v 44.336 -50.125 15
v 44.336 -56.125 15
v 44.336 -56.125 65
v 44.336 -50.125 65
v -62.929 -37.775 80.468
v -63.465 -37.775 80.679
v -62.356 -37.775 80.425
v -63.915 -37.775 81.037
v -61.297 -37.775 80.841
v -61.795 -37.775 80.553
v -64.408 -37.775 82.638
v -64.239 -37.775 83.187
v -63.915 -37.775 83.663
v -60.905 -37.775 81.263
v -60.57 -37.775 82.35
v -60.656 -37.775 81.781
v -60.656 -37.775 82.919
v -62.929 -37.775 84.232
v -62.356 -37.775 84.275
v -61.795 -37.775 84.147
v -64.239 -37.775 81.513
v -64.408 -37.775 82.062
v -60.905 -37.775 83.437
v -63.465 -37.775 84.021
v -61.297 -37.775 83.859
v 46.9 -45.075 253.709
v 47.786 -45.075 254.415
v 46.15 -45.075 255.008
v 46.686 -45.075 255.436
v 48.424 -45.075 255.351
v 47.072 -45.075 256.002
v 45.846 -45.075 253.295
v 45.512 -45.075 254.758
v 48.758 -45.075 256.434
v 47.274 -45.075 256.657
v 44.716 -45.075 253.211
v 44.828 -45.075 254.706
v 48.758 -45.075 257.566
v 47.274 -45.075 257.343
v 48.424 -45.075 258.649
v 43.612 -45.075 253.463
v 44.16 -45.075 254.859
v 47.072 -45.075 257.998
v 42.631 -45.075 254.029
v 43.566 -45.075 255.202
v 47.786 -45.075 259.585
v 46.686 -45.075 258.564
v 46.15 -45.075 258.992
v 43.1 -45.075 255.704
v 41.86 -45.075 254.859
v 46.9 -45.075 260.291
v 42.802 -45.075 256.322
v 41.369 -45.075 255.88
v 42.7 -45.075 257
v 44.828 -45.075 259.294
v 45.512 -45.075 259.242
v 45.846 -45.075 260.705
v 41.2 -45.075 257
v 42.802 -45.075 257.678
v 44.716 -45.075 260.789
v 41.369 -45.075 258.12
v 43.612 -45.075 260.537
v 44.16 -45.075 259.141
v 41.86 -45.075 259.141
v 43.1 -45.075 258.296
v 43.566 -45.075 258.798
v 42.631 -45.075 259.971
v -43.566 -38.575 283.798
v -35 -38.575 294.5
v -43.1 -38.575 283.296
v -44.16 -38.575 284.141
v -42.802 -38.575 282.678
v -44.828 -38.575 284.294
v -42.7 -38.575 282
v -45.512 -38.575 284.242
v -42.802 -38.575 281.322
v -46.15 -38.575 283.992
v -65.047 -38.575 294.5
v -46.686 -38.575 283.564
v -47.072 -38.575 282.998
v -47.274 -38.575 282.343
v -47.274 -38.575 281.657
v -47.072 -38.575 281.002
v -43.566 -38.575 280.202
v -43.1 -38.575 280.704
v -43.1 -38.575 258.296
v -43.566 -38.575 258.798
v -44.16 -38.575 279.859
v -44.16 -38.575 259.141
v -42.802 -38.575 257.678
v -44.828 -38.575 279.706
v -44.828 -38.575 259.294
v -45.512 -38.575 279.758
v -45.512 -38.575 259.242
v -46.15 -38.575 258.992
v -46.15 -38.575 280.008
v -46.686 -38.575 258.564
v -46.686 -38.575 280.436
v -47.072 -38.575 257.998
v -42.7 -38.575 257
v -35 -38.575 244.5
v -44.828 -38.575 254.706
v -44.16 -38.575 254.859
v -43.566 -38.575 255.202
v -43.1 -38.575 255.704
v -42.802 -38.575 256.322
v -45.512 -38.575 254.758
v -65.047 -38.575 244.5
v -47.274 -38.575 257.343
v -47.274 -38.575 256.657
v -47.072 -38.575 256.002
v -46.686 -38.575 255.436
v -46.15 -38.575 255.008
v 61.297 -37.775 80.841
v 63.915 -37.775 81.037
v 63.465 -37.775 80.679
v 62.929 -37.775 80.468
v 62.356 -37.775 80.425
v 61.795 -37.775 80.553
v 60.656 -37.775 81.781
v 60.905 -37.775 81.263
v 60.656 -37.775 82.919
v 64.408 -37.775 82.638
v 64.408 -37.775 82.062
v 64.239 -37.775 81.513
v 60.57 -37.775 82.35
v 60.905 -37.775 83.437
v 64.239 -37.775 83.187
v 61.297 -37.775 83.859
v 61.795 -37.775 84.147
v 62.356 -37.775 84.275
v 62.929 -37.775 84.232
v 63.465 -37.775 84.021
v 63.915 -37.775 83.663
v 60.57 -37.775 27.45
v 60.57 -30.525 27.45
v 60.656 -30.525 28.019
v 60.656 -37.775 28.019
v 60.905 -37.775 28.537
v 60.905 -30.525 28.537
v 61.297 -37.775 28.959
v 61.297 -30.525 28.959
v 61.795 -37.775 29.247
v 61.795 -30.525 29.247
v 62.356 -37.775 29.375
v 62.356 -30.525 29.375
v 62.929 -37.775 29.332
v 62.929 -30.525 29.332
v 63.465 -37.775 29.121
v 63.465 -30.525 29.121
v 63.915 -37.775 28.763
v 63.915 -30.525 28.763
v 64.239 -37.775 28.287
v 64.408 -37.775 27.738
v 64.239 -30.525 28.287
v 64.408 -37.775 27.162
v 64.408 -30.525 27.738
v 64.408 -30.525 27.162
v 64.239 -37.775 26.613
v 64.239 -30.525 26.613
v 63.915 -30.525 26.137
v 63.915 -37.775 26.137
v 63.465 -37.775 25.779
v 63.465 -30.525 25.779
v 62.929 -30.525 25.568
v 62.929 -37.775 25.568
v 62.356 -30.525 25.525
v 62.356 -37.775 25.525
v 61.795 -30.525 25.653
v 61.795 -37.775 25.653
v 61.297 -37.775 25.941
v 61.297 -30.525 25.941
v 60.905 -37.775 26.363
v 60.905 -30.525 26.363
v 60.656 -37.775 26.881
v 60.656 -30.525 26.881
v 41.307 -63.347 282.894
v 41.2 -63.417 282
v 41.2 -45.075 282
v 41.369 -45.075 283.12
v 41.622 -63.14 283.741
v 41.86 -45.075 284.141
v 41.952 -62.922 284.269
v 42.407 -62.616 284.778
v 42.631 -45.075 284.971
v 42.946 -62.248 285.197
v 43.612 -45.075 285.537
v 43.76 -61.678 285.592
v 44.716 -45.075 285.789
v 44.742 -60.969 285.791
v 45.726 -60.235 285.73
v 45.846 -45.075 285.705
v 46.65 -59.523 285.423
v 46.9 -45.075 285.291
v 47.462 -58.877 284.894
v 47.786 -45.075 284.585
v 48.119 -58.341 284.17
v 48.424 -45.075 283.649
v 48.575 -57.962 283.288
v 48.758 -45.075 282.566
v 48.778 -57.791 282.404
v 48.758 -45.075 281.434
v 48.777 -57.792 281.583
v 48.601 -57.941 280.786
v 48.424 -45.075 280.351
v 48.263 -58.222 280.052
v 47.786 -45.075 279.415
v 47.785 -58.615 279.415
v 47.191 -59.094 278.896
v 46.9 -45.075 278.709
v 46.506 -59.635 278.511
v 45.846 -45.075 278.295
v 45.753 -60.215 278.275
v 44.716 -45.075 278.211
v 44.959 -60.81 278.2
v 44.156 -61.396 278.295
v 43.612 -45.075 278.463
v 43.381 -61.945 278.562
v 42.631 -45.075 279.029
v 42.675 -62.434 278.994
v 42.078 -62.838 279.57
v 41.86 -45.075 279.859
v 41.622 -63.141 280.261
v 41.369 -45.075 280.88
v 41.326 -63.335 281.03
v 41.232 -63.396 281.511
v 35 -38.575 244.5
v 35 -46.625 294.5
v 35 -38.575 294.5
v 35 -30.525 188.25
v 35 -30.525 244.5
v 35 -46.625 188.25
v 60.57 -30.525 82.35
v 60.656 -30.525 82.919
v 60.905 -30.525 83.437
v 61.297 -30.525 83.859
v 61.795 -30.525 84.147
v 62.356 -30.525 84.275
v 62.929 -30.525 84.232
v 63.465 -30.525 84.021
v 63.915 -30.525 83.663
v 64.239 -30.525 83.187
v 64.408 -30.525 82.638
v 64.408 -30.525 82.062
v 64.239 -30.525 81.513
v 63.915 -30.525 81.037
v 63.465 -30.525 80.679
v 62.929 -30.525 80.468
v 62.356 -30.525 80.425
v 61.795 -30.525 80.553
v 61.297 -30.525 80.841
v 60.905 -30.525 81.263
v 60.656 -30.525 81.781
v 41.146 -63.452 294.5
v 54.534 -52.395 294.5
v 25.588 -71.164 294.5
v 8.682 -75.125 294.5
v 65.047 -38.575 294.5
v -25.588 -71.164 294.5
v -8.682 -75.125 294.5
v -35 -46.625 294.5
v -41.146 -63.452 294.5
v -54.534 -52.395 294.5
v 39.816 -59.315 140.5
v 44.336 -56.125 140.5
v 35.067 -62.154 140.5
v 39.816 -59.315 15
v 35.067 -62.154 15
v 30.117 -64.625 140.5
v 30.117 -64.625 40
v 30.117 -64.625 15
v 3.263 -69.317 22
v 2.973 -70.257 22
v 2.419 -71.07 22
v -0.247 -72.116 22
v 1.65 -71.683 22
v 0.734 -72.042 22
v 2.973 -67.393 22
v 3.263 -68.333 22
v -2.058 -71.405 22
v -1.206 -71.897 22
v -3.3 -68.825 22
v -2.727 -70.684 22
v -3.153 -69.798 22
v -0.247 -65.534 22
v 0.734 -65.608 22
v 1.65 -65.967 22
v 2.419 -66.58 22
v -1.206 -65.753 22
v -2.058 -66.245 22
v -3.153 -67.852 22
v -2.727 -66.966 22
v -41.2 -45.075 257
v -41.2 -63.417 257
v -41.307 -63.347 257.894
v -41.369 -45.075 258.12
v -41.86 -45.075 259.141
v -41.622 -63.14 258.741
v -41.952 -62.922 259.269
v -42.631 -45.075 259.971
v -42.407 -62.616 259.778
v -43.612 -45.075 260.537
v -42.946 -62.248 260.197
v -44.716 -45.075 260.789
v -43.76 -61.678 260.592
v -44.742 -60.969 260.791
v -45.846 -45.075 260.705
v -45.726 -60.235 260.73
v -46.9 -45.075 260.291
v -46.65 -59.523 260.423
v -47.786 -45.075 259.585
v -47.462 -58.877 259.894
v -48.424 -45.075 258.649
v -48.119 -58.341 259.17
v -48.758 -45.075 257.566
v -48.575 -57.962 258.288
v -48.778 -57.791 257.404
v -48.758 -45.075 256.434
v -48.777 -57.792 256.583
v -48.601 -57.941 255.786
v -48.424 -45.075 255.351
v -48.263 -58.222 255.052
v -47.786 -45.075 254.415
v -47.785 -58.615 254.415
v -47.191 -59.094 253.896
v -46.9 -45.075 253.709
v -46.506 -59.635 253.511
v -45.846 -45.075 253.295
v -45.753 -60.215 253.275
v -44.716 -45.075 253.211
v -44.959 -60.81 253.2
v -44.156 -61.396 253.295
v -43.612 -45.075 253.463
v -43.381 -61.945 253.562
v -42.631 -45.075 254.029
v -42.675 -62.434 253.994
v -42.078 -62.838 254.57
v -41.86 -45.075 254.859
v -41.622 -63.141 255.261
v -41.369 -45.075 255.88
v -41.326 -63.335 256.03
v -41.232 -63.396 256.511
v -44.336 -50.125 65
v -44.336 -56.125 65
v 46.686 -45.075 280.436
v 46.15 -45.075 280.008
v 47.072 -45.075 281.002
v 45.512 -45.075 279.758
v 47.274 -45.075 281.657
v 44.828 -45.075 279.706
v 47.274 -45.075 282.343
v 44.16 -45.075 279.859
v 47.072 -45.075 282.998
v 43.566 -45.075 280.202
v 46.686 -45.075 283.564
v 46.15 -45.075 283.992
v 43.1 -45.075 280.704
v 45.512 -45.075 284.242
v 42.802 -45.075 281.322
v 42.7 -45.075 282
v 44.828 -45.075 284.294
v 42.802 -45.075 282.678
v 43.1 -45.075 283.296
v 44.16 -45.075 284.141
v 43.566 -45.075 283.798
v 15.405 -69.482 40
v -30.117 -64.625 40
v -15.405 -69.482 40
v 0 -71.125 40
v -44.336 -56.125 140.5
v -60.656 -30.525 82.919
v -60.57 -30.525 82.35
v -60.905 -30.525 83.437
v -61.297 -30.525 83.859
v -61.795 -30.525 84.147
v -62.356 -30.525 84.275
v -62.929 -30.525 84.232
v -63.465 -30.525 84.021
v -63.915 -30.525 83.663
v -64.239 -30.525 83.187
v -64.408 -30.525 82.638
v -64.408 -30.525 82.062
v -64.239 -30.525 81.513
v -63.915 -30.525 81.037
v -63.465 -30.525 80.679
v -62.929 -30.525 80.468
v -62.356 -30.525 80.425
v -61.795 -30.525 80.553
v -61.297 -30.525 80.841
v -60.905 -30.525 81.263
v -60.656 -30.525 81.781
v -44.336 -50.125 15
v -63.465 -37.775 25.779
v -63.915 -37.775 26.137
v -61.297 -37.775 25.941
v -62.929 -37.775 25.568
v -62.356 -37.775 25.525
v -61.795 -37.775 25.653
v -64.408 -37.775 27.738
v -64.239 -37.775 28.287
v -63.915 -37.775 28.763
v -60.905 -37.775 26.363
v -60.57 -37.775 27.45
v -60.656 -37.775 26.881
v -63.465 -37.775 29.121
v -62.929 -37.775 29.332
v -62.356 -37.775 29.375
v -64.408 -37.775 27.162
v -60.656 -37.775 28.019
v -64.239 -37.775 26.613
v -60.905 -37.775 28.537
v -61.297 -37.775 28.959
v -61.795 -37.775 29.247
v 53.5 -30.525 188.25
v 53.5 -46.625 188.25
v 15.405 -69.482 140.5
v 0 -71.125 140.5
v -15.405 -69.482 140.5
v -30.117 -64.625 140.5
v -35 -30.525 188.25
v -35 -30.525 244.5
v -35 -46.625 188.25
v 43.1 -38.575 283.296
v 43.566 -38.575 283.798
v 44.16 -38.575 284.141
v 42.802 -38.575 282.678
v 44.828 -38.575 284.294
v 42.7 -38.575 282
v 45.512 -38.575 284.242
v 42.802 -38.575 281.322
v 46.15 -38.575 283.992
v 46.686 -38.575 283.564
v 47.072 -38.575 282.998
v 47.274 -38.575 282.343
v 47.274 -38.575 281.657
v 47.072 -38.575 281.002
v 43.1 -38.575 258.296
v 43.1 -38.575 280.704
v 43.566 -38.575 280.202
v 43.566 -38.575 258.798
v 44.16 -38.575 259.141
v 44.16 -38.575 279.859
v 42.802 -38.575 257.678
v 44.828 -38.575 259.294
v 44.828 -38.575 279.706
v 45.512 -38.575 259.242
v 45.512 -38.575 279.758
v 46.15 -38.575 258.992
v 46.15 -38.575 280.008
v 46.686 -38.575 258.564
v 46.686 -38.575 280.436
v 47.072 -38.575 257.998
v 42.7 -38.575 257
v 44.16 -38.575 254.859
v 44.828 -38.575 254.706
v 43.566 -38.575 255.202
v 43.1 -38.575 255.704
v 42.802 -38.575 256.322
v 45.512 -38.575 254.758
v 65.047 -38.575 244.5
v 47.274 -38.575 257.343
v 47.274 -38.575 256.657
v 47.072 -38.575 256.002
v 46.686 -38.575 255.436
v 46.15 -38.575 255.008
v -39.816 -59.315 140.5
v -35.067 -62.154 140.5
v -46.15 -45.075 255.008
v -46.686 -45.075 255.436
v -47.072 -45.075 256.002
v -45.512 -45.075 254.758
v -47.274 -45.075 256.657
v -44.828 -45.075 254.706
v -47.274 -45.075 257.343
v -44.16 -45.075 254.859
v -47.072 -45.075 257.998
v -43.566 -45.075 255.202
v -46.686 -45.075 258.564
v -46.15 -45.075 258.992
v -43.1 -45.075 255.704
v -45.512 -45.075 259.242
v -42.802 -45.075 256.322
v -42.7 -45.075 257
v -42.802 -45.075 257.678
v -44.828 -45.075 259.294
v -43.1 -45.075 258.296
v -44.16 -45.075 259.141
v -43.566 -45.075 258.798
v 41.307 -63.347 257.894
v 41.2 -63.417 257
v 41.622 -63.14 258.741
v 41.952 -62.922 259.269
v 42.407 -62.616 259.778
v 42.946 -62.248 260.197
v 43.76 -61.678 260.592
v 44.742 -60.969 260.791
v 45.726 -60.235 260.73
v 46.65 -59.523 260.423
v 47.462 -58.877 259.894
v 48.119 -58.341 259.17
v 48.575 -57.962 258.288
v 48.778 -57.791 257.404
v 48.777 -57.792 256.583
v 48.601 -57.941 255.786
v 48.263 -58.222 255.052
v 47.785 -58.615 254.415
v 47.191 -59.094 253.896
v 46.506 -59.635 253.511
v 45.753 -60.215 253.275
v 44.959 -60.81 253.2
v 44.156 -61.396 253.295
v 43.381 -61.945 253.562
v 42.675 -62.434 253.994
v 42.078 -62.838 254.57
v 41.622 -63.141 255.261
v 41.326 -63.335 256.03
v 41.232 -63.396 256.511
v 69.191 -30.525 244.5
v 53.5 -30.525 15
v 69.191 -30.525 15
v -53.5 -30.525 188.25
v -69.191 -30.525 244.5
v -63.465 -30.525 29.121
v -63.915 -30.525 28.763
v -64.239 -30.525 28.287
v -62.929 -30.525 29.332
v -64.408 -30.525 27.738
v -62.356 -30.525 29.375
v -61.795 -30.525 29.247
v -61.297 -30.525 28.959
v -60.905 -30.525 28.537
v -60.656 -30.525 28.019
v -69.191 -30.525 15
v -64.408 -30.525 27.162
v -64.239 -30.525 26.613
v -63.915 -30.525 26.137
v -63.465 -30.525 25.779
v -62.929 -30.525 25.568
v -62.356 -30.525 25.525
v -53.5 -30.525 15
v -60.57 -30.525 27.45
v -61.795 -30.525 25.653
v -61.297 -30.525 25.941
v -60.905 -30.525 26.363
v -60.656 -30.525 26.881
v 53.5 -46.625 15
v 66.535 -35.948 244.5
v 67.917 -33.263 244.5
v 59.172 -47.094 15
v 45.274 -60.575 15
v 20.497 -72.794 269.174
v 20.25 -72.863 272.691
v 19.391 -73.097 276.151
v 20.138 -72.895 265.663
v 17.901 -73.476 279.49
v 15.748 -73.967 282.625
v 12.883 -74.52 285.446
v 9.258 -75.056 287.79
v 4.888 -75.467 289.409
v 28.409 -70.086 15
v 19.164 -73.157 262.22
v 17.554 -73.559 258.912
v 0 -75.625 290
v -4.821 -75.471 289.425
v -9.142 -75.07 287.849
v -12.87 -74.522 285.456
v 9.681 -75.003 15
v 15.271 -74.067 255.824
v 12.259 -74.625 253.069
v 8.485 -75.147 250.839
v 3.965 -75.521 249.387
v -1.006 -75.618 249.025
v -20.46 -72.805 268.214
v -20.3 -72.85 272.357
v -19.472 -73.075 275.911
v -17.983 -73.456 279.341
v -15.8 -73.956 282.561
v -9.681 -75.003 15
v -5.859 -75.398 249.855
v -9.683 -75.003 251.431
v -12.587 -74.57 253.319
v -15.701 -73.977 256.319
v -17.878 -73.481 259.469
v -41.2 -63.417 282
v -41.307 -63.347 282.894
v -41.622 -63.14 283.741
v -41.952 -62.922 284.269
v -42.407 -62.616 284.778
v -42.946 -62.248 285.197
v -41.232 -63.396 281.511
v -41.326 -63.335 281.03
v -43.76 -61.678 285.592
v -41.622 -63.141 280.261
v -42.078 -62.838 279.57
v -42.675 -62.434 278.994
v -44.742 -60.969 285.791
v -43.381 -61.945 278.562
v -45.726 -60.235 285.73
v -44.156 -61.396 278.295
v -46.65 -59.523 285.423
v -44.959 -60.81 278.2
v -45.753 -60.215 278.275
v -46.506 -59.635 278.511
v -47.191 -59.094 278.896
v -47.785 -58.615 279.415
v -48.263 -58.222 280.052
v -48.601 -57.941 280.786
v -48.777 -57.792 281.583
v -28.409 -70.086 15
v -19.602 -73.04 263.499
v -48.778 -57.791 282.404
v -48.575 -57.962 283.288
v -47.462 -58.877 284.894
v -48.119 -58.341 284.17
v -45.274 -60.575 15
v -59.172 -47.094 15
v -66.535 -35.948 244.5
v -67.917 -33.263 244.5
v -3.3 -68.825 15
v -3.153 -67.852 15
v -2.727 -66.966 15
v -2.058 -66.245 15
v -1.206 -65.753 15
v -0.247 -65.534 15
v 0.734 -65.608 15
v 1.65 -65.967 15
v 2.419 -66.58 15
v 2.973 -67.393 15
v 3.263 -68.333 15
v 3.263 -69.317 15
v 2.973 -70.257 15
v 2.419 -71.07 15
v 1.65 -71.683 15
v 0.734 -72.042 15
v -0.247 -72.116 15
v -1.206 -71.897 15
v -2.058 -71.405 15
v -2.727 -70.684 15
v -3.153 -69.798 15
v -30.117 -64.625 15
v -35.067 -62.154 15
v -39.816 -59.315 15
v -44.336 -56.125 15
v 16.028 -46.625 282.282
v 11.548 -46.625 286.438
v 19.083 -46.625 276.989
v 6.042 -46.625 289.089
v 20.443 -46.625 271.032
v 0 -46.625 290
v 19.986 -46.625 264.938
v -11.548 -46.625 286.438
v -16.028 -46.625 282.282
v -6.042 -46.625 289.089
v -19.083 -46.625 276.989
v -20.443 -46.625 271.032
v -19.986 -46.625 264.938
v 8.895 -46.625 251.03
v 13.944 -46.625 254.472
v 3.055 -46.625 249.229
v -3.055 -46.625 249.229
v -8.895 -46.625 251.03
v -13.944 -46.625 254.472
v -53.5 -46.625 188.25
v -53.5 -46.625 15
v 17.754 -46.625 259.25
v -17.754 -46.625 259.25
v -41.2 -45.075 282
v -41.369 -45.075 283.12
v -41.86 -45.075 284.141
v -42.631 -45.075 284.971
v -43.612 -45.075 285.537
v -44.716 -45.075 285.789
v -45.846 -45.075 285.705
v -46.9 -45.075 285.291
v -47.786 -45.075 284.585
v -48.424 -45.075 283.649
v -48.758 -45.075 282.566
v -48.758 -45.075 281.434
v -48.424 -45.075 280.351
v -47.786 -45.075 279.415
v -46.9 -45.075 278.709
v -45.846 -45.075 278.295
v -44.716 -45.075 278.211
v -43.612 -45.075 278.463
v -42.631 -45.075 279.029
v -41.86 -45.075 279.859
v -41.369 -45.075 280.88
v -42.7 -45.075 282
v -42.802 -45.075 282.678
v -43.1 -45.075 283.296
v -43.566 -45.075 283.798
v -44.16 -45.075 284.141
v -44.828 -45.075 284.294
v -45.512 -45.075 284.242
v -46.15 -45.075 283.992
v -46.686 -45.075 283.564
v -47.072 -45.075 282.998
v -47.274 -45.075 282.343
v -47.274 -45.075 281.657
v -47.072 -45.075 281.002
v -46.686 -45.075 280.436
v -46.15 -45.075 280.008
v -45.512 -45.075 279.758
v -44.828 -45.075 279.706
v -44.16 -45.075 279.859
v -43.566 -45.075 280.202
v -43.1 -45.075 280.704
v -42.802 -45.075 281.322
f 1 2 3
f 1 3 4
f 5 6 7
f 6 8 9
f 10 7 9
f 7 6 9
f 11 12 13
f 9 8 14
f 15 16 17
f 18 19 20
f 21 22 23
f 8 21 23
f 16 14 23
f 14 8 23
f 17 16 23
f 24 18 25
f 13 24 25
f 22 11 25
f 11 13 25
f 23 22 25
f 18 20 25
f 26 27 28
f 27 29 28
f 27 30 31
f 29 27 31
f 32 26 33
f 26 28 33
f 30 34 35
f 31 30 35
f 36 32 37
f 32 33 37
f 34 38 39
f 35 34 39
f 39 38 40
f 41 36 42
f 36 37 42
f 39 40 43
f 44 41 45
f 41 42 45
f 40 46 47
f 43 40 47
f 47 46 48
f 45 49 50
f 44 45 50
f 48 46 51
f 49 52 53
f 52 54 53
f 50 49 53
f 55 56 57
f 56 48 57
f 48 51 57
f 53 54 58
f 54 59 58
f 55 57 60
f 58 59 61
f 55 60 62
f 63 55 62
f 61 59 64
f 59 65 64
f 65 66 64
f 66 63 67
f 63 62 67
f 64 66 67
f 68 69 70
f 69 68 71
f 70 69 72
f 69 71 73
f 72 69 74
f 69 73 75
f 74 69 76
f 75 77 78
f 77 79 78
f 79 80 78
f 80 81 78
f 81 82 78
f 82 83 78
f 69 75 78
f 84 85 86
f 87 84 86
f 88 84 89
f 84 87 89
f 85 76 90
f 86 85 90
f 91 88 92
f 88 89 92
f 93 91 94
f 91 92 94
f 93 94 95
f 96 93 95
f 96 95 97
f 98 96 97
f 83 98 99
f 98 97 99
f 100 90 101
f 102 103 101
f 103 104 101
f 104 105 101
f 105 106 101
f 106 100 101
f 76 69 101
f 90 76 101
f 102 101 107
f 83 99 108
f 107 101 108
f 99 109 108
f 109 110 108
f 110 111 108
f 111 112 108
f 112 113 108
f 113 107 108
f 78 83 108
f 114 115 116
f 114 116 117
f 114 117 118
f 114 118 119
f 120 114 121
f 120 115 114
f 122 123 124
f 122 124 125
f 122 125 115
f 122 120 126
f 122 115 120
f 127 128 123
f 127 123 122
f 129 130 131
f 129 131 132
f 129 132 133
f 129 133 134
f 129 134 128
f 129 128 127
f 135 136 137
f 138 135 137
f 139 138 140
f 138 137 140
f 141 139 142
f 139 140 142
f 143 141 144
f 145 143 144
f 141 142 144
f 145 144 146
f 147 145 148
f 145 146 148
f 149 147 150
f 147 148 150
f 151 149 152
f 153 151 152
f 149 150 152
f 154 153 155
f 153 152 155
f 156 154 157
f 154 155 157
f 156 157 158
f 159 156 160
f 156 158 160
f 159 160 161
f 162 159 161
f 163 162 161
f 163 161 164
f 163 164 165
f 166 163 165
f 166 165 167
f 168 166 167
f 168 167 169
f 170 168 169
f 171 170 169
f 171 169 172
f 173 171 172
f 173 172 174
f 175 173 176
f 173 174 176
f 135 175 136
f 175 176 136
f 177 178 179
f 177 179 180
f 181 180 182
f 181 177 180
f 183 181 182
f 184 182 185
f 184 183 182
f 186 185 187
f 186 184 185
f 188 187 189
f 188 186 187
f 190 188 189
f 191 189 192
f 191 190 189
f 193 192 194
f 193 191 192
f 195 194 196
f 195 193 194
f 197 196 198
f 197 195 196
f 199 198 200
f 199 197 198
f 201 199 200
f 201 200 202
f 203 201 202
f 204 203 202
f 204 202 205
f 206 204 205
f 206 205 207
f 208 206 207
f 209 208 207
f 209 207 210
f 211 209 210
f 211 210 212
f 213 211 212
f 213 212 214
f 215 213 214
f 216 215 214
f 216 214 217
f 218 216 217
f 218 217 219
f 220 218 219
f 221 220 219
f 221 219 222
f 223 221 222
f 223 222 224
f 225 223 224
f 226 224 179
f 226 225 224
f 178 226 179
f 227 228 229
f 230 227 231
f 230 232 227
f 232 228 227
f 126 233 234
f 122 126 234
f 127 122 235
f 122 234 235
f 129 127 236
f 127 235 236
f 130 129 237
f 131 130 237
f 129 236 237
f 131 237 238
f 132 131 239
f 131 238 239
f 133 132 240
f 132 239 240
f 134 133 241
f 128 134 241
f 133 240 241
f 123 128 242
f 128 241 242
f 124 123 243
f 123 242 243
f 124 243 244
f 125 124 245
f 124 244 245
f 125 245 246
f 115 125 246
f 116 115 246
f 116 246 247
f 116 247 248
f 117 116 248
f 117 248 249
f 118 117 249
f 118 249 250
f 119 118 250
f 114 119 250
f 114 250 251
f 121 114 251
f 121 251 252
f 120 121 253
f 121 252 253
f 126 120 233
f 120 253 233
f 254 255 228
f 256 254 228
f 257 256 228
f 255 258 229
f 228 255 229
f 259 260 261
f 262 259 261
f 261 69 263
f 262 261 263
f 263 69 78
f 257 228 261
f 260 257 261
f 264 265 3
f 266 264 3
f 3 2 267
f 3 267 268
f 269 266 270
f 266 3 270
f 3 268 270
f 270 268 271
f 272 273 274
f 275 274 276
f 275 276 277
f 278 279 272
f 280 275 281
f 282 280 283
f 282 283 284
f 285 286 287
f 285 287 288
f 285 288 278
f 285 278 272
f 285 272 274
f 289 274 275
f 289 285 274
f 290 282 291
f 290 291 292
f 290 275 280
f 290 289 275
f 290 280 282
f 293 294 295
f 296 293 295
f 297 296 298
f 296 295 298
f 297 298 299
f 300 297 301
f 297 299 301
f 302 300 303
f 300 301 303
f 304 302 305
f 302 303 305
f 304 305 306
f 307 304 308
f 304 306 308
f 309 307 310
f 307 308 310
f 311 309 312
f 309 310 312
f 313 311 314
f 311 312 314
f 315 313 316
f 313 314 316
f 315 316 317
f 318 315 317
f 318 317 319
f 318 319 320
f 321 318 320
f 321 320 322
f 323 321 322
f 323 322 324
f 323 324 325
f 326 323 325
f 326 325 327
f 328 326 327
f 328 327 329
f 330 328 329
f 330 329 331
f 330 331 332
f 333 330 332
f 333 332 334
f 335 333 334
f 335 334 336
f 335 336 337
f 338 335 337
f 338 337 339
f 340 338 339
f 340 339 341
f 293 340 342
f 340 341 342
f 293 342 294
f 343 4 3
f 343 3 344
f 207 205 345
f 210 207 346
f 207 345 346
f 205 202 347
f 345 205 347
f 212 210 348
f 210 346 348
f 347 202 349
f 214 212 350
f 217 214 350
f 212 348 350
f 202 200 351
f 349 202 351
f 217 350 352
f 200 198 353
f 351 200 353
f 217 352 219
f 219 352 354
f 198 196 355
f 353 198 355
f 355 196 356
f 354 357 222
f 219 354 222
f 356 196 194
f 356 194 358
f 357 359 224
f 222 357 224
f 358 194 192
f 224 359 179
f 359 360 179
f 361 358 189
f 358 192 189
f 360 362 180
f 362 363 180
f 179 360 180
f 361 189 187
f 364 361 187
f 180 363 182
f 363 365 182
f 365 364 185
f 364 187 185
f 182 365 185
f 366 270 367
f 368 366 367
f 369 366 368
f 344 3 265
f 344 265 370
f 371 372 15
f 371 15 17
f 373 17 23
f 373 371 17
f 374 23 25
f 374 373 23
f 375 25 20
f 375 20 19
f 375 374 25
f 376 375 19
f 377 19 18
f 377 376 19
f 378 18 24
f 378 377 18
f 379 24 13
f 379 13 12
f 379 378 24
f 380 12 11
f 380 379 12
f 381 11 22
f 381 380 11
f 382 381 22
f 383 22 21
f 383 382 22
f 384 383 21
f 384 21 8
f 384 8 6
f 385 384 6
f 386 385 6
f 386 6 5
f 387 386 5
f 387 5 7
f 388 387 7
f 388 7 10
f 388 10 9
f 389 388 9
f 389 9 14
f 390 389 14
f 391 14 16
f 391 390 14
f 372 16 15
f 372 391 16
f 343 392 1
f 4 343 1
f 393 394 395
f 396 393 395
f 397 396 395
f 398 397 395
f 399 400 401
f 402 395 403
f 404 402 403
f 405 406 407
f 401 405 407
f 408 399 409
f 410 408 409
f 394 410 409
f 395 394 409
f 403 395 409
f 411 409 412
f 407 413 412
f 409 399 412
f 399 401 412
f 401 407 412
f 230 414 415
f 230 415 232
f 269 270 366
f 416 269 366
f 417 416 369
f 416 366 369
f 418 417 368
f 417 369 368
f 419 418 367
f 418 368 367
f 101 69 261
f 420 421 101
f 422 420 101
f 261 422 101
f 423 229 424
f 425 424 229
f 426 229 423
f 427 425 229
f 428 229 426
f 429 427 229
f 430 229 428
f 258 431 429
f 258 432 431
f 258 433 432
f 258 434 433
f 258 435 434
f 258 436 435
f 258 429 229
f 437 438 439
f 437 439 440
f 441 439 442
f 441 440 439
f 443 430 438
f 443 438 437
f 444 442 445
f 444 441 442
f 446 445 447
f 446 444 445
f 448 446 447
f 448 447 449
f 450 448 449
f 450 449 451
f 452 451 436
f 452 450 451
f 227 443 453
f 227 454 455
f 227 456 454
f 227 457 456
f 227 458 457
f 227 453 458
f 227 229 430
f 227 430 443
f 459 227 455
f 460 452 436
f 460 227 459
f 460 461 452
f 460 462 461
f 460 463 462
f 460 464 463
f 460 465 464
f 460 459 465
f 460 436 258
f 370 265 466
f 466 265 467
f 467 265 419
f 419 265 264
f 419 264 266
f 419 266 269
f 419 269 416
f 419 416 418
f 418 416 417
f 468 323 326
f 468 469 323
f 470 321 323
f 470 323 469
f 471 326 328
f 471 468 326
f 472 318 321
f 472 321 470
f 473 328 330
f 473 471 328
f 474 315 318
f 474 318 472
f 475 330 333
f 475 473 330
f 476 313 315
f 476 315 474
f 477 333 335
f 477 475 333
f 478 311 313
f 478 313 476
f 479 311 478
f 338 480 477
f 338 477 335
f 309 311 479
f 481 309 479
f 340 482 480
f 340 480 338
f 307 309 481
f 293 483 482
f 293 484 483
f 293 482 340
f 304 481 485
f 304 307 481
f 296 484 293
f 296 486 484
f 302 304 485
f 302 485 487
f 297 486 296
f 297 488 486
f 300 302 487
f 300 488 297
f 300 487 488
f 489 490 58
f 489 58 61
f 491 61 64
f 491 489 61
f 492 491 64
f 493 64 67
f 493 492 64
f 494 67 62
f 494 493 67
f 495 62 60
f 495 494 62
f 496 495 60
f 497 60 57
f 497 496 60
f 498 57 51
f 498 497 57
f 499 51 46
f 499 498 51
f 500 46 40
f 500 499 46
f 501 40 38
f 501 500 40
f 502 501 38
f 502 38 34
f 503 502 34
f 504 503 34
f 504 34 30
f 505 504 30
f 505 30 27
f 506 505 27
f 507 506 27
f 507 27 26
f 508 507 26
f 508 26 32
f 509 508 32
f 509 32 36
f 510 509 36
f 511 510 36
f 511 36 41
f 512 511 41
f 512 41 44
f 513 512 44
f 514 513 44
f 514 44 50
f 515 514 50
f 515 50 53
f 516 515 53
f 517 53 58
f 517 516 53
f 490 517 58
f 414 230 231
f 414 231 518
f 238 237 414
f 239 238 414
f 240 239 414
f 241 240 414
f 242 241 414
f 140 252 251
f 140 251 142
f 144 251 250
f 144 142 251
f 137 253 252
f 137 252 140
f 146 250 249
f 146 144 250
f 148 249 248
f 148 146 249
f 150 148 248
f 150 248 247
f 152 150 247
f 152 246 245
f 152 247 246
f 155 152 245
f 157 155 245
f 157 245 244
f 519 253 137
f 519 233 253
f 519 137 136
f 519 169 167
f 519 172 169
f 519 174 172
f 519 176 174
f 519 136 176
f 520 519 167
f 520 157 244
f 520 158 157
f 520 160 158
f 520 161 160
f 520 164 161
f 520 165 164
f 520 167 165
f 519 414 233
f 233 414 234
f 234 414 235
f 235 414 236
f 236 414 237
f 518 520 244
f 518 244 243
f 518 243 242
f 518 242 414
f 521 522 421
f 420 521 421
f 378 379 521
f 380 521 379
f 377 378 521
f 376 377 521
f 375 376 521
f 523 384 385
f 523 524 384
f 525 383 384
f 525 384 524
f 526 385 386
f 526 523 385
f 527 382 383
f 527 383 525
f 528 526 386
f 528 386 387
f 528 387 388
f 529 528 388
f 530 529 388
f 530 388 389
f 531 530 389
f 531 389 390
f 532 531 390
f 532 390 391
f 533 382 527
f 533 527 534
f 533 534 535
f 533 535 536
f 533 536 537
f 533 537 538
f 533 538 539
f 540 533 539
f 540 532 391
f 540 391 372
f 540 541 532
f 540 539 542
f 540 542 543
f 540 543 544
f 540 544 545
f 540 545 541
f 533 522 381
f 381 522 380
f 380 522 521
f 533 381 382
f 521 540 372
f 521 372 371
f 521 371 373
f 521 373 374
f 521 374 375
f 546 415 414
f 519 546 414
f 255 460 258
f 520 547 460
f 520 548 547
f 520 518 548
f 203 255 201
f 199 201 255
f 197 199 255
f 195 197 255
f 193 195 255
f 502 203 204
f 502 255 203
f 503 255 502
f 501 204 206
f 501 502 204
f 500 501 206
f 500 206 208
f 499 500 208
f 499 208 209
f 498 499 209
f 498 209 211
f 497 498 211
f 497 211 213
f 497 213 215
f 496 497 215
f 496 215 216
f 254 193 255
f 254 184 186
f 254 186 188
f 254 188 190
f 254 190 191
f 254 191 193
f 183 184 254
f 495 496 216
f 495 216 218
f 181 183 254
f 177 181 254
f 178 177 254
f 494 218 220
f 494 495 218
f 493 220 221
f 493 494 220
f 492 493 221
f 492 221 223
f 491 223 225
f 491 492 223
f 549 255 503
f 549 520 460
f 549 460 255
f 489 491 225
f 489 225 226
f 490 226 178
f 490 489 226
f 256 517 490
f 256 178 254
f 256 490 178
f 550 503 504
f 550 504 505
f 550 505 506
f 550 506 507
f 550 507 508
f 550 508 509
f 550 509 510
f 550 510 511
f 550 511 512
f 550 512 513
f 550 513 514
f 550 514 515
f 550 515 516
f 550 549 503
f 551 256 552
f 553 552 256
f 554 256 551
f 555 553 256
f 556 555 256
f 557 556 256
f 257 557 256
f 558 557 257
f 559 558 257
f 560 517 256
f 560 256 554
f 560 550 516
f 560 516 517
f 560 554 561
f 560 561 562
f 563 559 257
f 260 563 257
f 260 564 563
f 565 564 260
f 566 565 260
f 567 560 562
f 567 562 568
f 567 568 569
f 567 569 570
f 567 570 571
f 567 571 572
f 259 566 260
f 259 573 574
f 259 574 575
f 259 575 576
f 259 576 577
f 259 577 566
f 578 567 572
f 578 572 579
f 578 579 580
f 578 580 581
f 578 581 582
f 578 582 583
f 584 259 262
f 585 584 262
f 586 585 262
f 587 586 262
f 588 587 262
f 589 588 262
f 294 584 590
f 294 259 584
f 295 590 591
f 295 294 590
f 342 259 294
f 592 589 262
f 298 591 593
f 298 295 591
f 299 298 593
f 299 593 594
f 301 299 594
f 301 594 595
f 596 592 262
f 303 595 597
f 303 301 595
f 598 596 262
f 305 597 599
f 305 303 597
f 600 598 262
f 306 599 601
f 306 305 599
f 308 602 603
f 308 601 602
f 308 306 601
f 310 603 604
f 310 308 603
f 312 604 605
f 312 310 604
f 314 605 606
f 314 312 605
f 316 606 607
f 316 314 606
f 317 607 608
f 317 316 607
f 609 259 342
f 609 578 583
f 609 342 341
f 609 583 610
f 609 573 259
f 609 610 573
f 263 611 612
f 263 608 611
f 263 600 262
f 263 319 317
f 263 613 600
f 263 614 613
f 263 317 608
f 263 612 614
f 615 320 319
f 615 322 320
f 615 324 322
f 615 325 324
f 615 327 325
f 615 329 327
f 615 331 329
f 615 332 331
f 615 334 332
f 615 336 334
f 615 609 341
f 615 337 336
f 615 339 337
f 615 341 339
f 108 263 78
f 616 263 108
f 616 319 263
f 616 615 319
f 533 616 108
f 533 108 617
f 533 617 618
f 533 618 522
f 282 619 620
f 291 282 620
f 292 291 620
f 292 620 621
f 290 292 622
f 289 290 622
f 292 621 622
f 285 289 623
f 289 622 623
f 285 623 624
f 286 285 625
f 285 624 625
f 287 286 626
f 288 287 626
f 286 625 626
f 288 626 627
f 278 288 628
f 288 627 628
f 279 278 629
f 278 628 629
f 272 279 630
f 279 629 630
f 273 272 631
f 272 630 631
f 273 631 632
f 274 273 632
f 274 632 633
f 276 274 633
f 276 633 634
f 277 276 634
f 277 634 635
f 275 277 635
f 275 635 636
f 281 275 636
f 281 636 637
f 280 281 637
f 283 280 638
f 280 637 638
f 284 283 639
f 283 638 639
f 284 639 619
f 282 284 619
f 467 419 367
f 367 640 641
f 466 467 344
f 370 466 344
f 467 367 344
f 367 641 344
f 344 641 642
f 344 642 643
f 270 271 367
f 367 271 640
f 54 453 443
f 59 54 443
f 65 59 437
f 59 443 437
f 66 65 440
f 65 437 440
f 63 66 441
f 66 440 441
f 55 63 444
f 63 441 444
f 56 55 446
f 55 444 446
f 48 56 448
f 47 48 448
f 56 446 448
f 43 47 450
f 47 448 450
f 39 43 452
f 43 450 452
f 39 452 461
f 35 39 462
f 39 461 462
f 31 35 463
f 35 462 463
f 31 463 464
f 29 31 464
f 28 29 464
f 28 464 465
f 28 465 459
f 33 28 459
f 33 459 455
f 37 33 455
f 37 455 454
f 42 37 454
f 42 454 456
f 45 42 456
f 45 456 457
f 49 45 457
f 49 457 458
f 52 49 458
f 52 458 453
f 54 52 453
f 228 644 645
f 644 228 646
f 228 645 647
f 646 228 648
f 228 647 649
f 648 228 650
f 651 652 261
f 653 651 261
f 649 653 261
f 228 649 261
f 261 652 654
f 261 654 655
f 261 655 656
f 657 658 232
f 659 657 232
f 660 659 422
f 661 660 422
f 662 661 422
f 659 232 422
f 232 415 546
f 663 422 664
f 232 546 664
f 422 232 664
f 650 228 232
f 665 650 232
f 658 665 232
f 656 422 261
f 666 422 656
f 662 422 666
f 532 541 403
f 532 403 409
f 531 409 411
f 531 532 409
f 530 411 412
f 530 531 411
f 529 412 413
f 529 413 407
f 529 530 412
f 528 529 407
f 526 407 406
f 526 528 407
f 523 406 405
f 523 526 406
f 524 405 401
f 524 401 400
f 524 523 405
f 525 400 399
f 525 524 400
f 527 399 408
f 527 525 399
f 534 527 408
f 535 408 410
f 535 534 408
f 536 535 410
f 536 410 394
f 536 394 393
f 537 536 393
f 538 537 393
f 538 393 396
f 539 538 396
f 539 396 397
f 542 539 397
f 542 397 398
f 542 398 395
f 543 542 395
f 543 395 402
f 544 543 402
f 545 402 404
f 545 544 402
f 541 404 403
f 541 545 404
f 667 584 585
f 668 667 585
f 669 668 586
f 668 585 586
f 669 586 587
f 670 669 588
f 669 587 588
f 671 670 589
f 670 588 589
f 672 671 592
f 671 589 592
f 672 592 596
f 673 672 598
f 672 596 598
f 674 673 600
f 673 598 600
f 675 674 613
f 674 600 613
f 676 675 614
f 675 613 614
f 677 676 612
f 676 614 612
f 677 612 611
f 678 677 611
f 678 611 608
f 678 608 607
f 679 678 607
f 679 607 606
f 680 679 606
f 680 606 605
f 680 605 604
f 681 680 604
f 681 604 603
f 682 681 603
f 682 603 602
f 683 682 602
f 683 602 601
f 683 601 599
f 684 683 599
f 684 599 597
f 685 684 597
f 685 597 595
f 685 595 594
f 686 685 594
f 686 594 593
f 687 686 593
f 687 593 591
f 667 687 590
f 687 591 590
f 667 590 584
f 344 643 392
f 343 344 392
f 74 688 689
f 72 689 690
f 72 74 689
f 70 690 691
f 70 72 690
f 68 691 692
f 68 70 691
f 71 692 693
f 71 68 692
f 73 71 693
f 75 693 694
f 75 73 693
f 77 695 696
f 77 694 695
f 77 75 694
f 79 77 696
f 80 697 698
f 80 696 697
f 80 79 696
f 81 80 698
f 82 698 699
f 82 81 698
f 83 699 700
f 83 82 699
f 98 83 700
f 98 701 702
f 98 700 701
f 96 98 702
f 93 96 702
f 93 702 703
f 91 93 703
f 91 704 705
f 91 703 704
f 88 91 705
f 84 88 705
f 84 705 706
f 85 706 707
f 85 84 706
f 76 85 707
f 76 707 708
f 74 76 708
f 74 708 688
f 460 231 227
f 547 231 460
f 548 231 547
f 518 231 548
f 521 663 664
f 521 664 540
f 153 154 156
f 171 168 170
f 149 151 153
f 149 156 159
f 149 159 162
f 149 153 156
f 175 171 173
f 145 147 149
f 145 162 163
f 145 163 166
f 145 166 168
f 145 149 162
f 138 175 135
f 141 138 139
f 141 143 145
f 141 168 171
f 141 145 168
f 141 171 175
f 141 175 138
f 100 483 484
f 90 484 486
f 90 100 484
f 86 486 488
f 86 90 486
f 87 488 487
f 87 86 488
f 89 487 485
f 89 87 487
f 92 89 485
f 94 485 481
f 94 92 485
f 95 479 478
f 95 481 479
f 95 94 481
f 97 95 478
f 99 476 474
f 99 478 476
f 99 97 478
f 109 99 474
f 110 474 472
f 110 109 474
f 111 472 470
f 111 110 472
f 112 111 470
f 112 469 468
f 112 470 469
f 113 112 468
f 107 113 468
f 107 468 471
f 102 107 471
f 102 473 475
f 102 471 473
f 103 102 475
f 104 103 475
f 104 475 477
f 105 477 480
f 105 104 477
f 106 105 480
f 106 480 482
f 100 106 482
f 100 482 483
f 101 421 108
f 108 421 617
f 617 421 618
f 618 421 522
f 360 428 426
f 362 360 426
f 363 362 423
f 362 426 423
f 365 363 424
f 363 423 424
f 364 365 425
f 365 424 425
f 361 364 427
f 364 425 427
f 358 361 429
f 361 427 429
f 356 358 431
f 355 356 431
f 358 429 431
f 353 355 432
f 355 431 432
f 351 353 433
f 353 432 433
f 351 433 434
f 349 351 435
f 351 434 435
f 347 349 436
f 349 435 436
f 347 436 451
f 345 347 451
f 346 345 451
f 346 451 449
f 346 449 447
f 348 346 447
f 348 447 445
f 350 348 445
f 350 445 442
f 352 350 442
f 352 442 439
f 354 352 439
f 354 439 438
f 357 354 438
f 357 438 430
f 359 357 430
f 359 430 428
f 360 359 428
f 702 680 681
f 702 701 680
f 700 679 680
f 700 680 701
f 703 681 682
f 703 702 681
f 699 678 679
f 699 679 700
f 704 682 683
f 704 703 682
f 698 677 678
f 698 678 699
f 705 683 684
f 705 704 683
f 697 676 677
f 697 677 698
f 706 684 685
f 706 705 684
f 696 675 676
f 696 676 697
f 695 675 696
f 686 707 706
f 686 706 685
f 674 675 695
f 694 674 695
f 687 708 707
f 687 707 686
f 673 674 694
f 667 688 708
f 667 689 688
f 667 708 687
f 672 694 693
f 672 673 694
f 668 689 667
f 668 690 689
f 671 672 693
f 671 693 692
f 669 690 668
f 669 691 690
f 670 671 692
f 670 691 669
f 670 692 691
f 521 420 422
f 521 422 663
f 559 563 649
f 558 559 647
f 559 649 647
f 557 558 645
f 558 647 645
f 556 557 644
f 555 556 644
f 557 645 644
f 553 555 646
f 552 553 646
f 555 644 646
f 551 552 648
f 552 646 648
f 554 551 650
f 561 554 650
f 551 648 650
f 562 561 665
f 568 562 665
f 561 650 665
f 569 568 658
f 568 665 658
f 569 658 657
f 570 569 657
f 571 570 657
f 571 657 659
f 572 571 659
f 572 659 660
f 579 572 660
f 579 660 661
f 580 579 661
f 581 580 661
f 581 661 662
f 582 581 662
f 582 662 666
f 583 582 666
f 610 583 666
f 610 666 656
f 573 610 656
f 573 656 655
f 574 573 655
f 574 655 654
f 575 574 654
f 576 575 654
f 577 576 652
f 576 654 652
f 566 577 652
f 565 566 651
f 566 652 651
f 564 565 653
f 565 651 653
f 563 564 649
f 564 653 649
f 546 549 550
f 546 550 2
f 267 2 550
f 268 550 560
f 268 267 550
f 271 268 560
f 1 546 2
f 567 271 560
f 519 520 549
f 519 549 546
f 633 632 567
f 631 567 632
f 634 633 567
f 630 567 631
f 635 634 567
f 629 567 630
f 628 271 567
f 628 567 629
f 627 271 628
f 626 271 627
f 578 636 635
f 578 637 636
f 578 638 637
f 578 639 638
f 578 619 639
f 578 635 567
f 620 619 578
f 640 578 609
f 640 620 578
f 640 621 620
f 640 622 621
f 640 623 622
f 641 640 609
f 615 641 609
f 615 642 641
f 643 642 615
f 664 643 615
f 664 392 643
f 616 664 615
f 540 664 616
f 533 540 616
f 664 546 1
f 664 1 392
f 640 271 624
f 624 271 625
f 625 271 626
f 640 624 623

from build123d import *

# Parameters (mm, degrees)
BOSS_EXTRUDE1_START = 15
BOSS_EXTRUDE1_DEPTH = 279.5
SKETCH3_W           = 107
SKETCH3_H           = 93.25
CUT_EXTRUDE1_DEPTH  = 173.25
SKETCH4_R           = 20.5
CUT_EXTRUDE2_DEPTH  = 304.90560212
CUT_EXTRUDE3_START  = -50
CUT_EXTRUDE3_DEPTH  = 50
SKETCH7_R           = 2.3
CUT_EXTRUDE5_DEPTH  = 305.779129174
CUT_EXTRUDE8_START  = -304.43404156
SKETCH11_R          = 3.8
CUT_EXTRUDE8_DEPTH  = 311.43404156
SKETCH14_R          = 1.93
CUT_EXTRUDE9_DEPTH  = 7.25
SKETCH18_W          = 44.336356413
SKETCH18_H          = 6
CUT_EXTRUDE10_DEPTH = 125.5
CUT_EXTRUDE12_DEPTH = 100.5
SKETCH20_W          = 88.672712826
SKETCH20_H          = 6
BOSS_EXTRUDE2_DEPTH = 75.5
SCREW_HEAD_HOLE_R   = 3.3
SCREW_HEAD_HOLE_R_2 = 1.45
CUT_EXTRUDE13_DEPTH = 7


with BuildPart() as part:
    # Sketch1 → Boss-Extrude1 (new body)
    with BuildSketch(Plane.XY.offset(BOSS_EXTRUDE1_START)):
        with BuildLine():
            Line((-69.190786959, -30.525), (-35, -30.525))
            Line((-35, -30.525), (-35, -46.625))
            Line((-35, -46.625), (35, -46.625))
            Line((35, -46.625), (35, -30.525))
            Line((35, -30.525), (69.190786959, -30.525))
            ThreePointArc((69.190786959, -30.525), (0, -75.625), (-69.190786959, -30.525))
        make_face()
    extrude(amount=BOSS_EXTRUDE1_DEPTH)

    # Sketch3 → Cut-Extrude1 (cut)
    with BuildSketch(Plane(origin=(0, 0, 15), x_dir=(-1, 0, 0), z_dir=(0, 0, -1))):
        Rectangle(SKETCH3_W, SKETCH3_H)
    extrude(amount=-CUT_EXTRUDE1_DEPTH, mode=Mode.SUBTRACT)

    # Sketch4 → Cut-Extrude2 (cut, through all)
    with BuildSketch(Plane(origin=(0, -46.625, 0), x_dir=(1, 0, 0), z_dir=(0, 1, 0))):
        with Locations(Location((0, -269.5, 0), (0, 0, 270))):
            Circle(SKETCH4_R)
    extrude(amount=-CUT_EXTRUDE2_DEPTH, mode=Mode.SUBTRACT)

    # Sketch2 → Cut-Extrude3 (cut)
    with BuildSketch(Plane.XY.offset(294.5).offset(CUT_EXTRUDE3_START)):
        with BuildLine():
            Line((-35, -30.525), (-35, -38.575))
            Line((-35, -38.575), (-65.04698302, -38.575))
            ThreePointArc((-65.04698302, -38.575), (-67.239462723, -34.612068383), (-69.190786959, -30.525))
            Line((-69.190786959, -30.525), (-35, -30.525))
        make_face()
    cut_extrude3 = extrude(amount=CUT_EXTRUDE3_DEPTH, mode=Mode.SUBTRACT)

    # Mirror1: Cut-Extrude3 across plane
    add(cut_extrude3.mirror(Plane(origin=(0, 0, 0), x_dir=(0, 0, 1), z_dir=(1, 0, 0))), mode=Mode.SUBTRACT)

    # Sketch7 → Cut-Extrude5 (cut, through all)
    with BuildSketch(Plane(origin=(0, -38.575, 0), x_dir=(1, 0, 0), z_dir=(0, 1, 0))):
        with Locations(Location((45, -257, 0), (0, 0, 180))):
            Circle(SKETCH7_R)
        with Locations(Location((45, -282, 0), (0, 0, 180))):
            Circle(SKETCH7_R)
    cut_extrude5 = extrude(amount=-CUT_EXTRUDE5_DEPTH, mode=Mode.SUBTRACT)

    # Mirror2: Cut-Extrude5 across plane
    add(cut_extrude5.mirror(Plane(origin=(0, 0, 0), x_dir=(0, 0, 1), z_dir=(1, 0, 0))), mode=Mode.SUBTRACT)

    # Sketch11 → Cut-Extrude8 (cut)
    with BuildSketch(Plane(origin=(0, -52.075, 0), x_dir=(1, 0, 0), z_dir=(0, 1, 0)).offset(CUT_EXTRUDE8_START)):
        with Locations(Location((45, -282, 0), (0, 0, 180))):
            Circle(SKETCH11_R)
        with Locations(Location((45, -257, 0), (0, 0, 180))):
            Circle(SKETCH11_R)
    cut_extrude8 = extrude(amount=CUT_EXTRUDE8_DEPTH, mode=Mode.SUBTRACT)

    # Mirror3: Cut-Extrude8 across plane
    add(cut_extrude8.mirror(Plane(origin=(0, 0, 0), x_dir=(0, 0, 1), z_dir=(1, 0, 0))), mode=Mode.SUBTRACT)

    # Sketch14 → Cut-Extrude9 (cut)
    with BuildSketch(Plane(origin=(0, -30.525, 0), x_dir=(1, 0, 0), z_dir=(0, 1, 0))):
        with Locations(Location((62.5, -27.45, 0), (0, 0, 180))):
            Circle(SKETCH14_R)
        with Locations(Location((62.5, -82.35, 0), (0, 0, 180))):
            Circle(SKETCH14_R)
    cut_extrude9 = extrude(amount=-CUT_EXTRUDE9_DEPTH, mode=Mode.SUBTRACT)

    # Mirror4: Cut-Extrude9 across plane
    add(cut_extrude9.mirror(Plane(origin=(0, 0, 0), x_dir=(0, 0, 1), z_dir=(1, 0, 0))), mode=Mode.SUBTRACT)

    # Sketch18 → Cut-Extrude10 (cut)
    with BuildSketch(Plane(origin=(0, 0, 15), x_dir=(-1, 0, 0), z_dir=(0, 0, -1))):
        with Locations((-22.168178207, -53.125)):
            Rectangle(SKETCH18_W, SKETCH18_H)
        with Locations((22.168178207, -53.125)):
            Rectangle(SKETCH18_W, SKETCH18_H)
        with BuildLine():
            Line((42.207819181, -56.625), (0, -56.625))
            Line((0, -56.625), (0, -64.625))
            Line((0, -64.625), (28.486839066, -64.625))
            ThreePointArc((28.486839066, -64.625), (35.572934602, -61.011941035), (42.207819181, -56.625))
        make_face()
        with BuildLine():
            Line((0, -64.625), (0, -56.625))
            Line((0, -56.625), (-42.207819181, -56.625))
            ThreePointArc((-42.207819181, -56.625), (-35.572934602, -61.011941035), (-28.486839066, -64.625))
            Line((-28.486839066, -64.625), (0, -64.625))
        make_face()
        with BuildLine():
            Line((42.207819181, -56.625), (0, -56.625))
            Line((0, -56.625), (0, -64.625))
            Line((0, -64.625), (28.486839066, -64.625))
            ThreePointArc((28.486839066, -64.625), (35.572934602, -61.011941035), (42.207819181, -56.625))
        make_face()
        with BuildLine():
            Line((0, -64.625), (0, -56.625))
            Line((0, -56.625), (-42.207819181, -56.625))
            ThreePointArc((-42.207819181, -56.625), (-35.572934602, -61.011941035), (-28.486839066, -64.625))
            Line((-28.486839066, -64.625), (0, -64.625))
        make_face()
        with BuildLine():
            Line((-42.207819181, -56.625), (0, -56.625))
            Line((0, -56.625), (0, -56.125))
            Line((0, -56.125), (-44.336356413, -56.125))
            ThreePointArc((-44.336356413, -56.125), (-37.468701056, -60.779511824), (-30.117416058, -64.625))
            Line((-30.117416058, -64.625), (-28.486839066, -64.625))
            ThreePointArc((-28.486839066, -64.625), (-35.572934602, -61.011941035), (-42.207819181, -56.625))
        make_face()
        with BuildLine():
            Line((0, -56.125), (0, -56.625))
            Line((0, -56.625), (42.207819181, -56.625))
            ThreePointArc((42.207819181, -56.625), (35.572934602, -61.011941035), (28.486839066, -64.625))
            Line((28.486839066, -64.625), (30.117416058, -64.625))
            ThreePointArc((30.117416058, -64.625), (37.468701056, -60.779511824), (44.336356413, -56.125))
            Line((44.336356413, -56.125), (0, -56.125))
        make_face()
        with BuildLine():
            Line((-42.207819181, -56.625), (0, -56.625))
            Line((0, -56.625), (0, -56.125))
            Line((0, -56.125), (-44.336356413, -56.125))
            ThreePointArc((-44.336356413, -56.125), (-37.468701056, -60.779511824), (-30.117416058, -64.625))
            Line((-30.117416058, -64.625), (-28.486839066, -64.625))
            ThreePointArc((-28.486839066, -64.625), (-35.572934602, -61.011941035), (-42.207819181, -56.625))
        make_face()
        with BuildLine():
            Line((0, -56.125), (0, -56.625))
            Line((0, -56.625), (42.207819181, -56.625))
            ThreePointArc((42.207819181, -56.625), (35.572934602, -61.011941035), (28.486839066, -64.625))
            Line((28.486839066, -64.625), (30.117416058, -64.625))
            ThreePointArc((30.117416058, -64.625), (37.468701056, -60.779511824), (44.336356413, -56.125))
            Line((44.336356413, -56.125), (0, -56.125))
        make_face()
    extrude(amount=-CUT_EXTRUDE10_DEPTH, mode=Mode.SUBTRACT)

    # Sketch19 → Cut-Extrude12 (cut)
    with BuildSketch(Plane(origin=(0, 0, 40), x_dir=(-1, 0, 0), z_dir=(0, 0, -1))):
        with BuildLine():
            ThreePointArc((-30.117416058, -64.625), (0, -71.125), (30.117416058, -64.625))
            Line((30.117416058, -64.625), (-30.117416058, -64.625))
        make_face()
    extrude(amount=-CUT_EXTRUDE12_DEPTH, mode=Mode.SUBTRACT)

    # Sketch20 → Boss-Extrude2 (add)
    with BuildSketch(Plane(origin=(0, 0, 65), x_dir=(-1, 0, 0), z_dir=(0, 0, -1))):
        with Locations((0, -53.125)):
            Rectangle(SKETCH20_W, SKETCH20_H)
    extrude(amount=-BOSS_EXTRUDE2_DEPTH)

    # screw head hole → Cut-Extrude13 (cut)
    # profile 1 of 2: a face of its own
    with BuildSketch(Plane(origin=(0, 0, 15), x_dir=(-1, 0, 0), z_dir=(0, 0, -1))):
        with Locations((0, -68.825)):
            Circle(SCREW_HEAD_HOLE_R)
        with Locations((0, -68.825)):
            Circle(SCREW_HEAD_HOLE_R_2, mode=Mode.SUBTRACT)
    # profile 2 of 2: a face of its own
    with BuildSketch(Plane(origin=(0, 0, 15), x_dir=(-1, 0, 0), z_dir=(0, 0, -1))):
        with Locations((0, -68.825)):
            Circle(SCREW_HEAD_HOLE_R_2)
    extrude(amount=-CUT_EXTRUDE13_DEPTH, mode=Mode.SUBTRACT)


solid = part.part
